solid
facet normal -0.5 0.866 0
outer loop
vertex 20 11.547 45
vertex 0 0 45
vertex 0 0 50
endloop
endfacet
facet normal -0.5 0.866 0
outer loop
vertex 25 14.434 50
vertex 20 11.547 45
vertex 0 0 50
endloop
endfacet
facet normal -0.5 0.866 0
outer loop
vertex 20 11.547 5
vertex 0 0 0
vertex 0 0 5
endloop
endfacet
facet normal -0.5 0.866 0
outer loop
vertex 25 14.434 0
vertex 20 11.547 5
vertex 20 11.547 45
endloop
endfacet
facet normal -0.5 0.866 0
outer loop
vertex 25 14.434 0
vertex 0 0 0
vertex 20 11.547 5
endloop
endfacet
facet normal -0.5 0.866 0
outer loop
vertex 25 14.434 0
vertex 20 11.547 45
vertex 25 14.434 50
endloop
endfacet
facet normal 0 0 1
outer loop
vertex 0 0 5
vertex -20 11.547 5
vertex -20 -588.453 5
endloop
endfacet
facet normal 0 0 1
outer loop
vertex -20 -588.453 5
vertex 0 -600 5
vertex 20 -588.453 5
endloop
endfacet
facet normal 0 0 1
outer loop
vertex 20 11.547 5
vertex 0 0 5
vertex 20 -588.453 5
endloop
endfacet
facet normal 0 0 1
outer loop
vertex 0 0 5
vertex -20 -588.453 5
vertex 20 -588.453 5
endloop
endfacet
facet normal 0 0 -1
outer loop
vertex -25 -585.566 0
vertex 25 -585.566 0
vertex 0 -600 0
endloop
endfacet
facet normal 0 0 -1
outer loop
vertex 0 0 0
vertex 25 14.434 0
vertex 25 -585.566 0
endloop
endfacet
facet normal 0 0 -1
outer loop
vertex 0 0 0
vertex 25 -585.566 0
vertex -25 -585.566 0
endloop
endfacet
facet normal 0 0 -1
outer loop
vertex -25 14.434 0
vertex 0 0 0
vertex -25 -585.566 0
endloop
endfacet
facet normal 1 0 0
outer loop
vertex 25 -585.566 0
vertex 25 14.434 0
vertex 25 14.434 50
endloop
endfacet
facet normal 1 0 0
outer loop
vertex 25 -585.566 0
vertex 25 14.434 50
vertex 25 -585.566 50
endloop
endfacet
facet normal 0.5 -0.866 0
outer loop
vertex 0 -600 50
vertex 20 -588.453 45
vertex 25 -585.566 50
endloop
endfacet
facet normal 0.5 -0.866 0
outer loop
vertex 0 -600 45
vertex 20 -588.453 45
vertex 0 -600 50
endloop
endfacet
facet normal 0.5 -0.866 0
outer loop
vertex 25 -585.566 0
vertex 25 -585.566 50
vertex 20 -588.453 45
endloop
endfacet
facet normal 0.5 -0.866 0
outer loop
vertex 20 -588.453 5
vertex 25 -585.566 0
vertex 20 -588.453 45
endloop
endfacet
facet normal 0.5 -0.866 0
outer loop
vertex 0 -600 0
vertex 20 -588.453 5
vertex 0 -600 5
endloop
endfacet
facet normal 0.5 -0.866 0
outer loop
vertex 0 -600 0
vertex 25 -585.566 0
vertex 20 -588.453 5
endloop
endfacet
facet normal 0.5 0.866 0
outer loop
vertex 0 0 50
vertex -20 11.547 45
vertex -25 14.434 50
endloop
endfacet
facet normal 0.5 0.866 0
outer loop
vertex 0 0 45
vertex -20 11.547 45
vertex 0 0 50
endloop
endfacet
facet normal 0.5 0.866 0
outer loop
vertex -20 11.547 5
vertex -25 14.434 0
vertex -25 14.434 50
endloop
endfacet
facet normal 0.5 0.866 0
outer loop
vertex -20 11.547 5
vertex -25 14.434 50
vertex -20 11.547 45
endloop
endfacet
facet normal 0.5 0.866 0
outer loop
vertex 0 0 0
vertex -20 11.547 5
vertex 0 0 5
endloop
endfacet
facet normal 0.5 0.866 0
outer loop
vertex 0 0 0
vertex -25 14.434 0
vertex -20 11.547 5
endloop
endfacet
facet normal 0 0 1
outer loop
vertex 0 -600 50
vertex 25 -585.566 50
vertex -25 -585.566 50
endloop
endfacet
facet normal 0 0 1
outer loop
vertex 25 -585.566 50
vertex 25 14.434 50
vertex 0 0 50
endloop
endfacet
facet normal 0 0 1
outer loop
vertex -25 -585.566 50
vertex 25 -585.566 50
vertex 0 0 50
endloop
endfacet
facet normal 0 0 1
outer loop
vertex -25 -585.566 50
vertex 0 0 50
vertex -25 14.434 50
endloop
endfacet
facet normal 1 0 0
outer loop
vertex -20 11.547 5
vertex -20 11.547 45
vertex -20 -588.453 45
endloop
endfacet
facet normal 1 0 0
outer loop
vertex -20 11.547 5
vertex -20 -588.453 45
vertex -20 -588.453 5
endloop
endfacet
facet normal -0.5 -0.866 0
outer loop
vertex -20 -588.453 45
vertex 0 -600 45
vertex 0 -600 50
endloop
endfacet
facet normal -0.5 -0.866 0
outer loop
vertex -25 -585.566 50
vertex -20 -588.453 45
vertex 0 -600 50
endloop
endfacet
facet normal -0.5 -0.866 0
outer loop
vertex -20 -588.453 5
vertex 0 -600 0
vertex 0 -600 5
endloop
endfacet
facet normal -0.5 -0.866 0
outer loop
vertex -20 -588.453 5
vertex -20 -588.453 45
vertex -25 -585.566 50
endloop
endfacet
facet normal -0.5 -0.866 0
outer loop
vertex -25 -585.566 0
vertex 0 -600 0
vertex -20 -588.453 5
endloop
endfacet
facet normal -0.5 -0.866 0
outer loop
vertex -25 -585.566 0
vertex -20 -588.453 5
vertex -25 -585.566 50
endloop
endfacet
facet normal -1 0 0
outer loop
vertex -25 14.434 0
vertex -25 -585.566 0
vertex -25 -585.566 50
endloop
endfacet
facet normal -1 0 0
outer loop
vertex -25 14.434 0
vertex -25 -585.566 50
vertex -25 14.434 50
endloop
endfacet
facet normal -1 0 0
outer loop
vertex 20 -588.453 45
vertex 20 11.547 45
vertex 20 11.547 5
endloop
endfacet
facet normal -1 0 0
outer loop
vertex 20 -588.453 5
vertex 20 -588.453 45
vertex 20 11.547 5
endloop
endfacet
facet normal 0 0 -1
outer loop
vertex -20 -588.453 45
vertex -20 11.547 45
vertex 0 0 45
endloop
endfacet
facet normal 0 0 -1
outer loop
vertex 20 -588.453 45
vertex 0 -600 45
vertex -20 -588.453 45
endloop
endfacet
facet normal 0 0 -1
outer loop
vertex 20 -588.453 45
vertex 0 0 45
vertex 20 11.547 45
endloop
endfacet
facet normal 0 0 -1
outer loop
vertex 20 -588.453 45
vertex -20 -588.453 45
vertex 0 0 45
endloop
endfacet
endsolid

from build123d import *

# Parameters (mm, degrees)
BOSS_EXTRUDE1_DEPTH     = 50
CUT_EXTRUDE2_DEPTH      = 603.59853966
CUT_EXTRUDE2_DEPTH_BACK = 603.59853966
SKETCH3_W               = 40
SKETCH3_H               = 40


with BuildPart() as part:
    # Sketch1 → Boss-Extrude1 (new body)
    with BuildSketch(Plane.XY):
        Polygon((0, 0), (25, 14.43375673), (25, -585.56624327), (0, -600), (-25, -585.56624327), (-25, 14.43375673), align=None)
    extrude(amount=BOSS_EXTRUDE1_DEPTH)

    # Sketch3 → Cut-Extrude2 (cut, two sides: drawn at the far end of the back side and taken through both)
    with BuildSketch(Plane(origin=(0, 0, 0), x_dir=(1, 0, 0), z_dir=(0, 1, 0)).offset(-CUT_EXTRUDE2_DEPTH_BACK)):
        with Locations((0, -25)):
            Rectangle(SKETCH3_W, SKETCH3_H)
    extrude(amount=CUT_EXTRUDE2_DEPTH + CUT_EXTRUDE2_DEPTH_BACK, mode=Mode.SUBTRACT)


solid = part.part
